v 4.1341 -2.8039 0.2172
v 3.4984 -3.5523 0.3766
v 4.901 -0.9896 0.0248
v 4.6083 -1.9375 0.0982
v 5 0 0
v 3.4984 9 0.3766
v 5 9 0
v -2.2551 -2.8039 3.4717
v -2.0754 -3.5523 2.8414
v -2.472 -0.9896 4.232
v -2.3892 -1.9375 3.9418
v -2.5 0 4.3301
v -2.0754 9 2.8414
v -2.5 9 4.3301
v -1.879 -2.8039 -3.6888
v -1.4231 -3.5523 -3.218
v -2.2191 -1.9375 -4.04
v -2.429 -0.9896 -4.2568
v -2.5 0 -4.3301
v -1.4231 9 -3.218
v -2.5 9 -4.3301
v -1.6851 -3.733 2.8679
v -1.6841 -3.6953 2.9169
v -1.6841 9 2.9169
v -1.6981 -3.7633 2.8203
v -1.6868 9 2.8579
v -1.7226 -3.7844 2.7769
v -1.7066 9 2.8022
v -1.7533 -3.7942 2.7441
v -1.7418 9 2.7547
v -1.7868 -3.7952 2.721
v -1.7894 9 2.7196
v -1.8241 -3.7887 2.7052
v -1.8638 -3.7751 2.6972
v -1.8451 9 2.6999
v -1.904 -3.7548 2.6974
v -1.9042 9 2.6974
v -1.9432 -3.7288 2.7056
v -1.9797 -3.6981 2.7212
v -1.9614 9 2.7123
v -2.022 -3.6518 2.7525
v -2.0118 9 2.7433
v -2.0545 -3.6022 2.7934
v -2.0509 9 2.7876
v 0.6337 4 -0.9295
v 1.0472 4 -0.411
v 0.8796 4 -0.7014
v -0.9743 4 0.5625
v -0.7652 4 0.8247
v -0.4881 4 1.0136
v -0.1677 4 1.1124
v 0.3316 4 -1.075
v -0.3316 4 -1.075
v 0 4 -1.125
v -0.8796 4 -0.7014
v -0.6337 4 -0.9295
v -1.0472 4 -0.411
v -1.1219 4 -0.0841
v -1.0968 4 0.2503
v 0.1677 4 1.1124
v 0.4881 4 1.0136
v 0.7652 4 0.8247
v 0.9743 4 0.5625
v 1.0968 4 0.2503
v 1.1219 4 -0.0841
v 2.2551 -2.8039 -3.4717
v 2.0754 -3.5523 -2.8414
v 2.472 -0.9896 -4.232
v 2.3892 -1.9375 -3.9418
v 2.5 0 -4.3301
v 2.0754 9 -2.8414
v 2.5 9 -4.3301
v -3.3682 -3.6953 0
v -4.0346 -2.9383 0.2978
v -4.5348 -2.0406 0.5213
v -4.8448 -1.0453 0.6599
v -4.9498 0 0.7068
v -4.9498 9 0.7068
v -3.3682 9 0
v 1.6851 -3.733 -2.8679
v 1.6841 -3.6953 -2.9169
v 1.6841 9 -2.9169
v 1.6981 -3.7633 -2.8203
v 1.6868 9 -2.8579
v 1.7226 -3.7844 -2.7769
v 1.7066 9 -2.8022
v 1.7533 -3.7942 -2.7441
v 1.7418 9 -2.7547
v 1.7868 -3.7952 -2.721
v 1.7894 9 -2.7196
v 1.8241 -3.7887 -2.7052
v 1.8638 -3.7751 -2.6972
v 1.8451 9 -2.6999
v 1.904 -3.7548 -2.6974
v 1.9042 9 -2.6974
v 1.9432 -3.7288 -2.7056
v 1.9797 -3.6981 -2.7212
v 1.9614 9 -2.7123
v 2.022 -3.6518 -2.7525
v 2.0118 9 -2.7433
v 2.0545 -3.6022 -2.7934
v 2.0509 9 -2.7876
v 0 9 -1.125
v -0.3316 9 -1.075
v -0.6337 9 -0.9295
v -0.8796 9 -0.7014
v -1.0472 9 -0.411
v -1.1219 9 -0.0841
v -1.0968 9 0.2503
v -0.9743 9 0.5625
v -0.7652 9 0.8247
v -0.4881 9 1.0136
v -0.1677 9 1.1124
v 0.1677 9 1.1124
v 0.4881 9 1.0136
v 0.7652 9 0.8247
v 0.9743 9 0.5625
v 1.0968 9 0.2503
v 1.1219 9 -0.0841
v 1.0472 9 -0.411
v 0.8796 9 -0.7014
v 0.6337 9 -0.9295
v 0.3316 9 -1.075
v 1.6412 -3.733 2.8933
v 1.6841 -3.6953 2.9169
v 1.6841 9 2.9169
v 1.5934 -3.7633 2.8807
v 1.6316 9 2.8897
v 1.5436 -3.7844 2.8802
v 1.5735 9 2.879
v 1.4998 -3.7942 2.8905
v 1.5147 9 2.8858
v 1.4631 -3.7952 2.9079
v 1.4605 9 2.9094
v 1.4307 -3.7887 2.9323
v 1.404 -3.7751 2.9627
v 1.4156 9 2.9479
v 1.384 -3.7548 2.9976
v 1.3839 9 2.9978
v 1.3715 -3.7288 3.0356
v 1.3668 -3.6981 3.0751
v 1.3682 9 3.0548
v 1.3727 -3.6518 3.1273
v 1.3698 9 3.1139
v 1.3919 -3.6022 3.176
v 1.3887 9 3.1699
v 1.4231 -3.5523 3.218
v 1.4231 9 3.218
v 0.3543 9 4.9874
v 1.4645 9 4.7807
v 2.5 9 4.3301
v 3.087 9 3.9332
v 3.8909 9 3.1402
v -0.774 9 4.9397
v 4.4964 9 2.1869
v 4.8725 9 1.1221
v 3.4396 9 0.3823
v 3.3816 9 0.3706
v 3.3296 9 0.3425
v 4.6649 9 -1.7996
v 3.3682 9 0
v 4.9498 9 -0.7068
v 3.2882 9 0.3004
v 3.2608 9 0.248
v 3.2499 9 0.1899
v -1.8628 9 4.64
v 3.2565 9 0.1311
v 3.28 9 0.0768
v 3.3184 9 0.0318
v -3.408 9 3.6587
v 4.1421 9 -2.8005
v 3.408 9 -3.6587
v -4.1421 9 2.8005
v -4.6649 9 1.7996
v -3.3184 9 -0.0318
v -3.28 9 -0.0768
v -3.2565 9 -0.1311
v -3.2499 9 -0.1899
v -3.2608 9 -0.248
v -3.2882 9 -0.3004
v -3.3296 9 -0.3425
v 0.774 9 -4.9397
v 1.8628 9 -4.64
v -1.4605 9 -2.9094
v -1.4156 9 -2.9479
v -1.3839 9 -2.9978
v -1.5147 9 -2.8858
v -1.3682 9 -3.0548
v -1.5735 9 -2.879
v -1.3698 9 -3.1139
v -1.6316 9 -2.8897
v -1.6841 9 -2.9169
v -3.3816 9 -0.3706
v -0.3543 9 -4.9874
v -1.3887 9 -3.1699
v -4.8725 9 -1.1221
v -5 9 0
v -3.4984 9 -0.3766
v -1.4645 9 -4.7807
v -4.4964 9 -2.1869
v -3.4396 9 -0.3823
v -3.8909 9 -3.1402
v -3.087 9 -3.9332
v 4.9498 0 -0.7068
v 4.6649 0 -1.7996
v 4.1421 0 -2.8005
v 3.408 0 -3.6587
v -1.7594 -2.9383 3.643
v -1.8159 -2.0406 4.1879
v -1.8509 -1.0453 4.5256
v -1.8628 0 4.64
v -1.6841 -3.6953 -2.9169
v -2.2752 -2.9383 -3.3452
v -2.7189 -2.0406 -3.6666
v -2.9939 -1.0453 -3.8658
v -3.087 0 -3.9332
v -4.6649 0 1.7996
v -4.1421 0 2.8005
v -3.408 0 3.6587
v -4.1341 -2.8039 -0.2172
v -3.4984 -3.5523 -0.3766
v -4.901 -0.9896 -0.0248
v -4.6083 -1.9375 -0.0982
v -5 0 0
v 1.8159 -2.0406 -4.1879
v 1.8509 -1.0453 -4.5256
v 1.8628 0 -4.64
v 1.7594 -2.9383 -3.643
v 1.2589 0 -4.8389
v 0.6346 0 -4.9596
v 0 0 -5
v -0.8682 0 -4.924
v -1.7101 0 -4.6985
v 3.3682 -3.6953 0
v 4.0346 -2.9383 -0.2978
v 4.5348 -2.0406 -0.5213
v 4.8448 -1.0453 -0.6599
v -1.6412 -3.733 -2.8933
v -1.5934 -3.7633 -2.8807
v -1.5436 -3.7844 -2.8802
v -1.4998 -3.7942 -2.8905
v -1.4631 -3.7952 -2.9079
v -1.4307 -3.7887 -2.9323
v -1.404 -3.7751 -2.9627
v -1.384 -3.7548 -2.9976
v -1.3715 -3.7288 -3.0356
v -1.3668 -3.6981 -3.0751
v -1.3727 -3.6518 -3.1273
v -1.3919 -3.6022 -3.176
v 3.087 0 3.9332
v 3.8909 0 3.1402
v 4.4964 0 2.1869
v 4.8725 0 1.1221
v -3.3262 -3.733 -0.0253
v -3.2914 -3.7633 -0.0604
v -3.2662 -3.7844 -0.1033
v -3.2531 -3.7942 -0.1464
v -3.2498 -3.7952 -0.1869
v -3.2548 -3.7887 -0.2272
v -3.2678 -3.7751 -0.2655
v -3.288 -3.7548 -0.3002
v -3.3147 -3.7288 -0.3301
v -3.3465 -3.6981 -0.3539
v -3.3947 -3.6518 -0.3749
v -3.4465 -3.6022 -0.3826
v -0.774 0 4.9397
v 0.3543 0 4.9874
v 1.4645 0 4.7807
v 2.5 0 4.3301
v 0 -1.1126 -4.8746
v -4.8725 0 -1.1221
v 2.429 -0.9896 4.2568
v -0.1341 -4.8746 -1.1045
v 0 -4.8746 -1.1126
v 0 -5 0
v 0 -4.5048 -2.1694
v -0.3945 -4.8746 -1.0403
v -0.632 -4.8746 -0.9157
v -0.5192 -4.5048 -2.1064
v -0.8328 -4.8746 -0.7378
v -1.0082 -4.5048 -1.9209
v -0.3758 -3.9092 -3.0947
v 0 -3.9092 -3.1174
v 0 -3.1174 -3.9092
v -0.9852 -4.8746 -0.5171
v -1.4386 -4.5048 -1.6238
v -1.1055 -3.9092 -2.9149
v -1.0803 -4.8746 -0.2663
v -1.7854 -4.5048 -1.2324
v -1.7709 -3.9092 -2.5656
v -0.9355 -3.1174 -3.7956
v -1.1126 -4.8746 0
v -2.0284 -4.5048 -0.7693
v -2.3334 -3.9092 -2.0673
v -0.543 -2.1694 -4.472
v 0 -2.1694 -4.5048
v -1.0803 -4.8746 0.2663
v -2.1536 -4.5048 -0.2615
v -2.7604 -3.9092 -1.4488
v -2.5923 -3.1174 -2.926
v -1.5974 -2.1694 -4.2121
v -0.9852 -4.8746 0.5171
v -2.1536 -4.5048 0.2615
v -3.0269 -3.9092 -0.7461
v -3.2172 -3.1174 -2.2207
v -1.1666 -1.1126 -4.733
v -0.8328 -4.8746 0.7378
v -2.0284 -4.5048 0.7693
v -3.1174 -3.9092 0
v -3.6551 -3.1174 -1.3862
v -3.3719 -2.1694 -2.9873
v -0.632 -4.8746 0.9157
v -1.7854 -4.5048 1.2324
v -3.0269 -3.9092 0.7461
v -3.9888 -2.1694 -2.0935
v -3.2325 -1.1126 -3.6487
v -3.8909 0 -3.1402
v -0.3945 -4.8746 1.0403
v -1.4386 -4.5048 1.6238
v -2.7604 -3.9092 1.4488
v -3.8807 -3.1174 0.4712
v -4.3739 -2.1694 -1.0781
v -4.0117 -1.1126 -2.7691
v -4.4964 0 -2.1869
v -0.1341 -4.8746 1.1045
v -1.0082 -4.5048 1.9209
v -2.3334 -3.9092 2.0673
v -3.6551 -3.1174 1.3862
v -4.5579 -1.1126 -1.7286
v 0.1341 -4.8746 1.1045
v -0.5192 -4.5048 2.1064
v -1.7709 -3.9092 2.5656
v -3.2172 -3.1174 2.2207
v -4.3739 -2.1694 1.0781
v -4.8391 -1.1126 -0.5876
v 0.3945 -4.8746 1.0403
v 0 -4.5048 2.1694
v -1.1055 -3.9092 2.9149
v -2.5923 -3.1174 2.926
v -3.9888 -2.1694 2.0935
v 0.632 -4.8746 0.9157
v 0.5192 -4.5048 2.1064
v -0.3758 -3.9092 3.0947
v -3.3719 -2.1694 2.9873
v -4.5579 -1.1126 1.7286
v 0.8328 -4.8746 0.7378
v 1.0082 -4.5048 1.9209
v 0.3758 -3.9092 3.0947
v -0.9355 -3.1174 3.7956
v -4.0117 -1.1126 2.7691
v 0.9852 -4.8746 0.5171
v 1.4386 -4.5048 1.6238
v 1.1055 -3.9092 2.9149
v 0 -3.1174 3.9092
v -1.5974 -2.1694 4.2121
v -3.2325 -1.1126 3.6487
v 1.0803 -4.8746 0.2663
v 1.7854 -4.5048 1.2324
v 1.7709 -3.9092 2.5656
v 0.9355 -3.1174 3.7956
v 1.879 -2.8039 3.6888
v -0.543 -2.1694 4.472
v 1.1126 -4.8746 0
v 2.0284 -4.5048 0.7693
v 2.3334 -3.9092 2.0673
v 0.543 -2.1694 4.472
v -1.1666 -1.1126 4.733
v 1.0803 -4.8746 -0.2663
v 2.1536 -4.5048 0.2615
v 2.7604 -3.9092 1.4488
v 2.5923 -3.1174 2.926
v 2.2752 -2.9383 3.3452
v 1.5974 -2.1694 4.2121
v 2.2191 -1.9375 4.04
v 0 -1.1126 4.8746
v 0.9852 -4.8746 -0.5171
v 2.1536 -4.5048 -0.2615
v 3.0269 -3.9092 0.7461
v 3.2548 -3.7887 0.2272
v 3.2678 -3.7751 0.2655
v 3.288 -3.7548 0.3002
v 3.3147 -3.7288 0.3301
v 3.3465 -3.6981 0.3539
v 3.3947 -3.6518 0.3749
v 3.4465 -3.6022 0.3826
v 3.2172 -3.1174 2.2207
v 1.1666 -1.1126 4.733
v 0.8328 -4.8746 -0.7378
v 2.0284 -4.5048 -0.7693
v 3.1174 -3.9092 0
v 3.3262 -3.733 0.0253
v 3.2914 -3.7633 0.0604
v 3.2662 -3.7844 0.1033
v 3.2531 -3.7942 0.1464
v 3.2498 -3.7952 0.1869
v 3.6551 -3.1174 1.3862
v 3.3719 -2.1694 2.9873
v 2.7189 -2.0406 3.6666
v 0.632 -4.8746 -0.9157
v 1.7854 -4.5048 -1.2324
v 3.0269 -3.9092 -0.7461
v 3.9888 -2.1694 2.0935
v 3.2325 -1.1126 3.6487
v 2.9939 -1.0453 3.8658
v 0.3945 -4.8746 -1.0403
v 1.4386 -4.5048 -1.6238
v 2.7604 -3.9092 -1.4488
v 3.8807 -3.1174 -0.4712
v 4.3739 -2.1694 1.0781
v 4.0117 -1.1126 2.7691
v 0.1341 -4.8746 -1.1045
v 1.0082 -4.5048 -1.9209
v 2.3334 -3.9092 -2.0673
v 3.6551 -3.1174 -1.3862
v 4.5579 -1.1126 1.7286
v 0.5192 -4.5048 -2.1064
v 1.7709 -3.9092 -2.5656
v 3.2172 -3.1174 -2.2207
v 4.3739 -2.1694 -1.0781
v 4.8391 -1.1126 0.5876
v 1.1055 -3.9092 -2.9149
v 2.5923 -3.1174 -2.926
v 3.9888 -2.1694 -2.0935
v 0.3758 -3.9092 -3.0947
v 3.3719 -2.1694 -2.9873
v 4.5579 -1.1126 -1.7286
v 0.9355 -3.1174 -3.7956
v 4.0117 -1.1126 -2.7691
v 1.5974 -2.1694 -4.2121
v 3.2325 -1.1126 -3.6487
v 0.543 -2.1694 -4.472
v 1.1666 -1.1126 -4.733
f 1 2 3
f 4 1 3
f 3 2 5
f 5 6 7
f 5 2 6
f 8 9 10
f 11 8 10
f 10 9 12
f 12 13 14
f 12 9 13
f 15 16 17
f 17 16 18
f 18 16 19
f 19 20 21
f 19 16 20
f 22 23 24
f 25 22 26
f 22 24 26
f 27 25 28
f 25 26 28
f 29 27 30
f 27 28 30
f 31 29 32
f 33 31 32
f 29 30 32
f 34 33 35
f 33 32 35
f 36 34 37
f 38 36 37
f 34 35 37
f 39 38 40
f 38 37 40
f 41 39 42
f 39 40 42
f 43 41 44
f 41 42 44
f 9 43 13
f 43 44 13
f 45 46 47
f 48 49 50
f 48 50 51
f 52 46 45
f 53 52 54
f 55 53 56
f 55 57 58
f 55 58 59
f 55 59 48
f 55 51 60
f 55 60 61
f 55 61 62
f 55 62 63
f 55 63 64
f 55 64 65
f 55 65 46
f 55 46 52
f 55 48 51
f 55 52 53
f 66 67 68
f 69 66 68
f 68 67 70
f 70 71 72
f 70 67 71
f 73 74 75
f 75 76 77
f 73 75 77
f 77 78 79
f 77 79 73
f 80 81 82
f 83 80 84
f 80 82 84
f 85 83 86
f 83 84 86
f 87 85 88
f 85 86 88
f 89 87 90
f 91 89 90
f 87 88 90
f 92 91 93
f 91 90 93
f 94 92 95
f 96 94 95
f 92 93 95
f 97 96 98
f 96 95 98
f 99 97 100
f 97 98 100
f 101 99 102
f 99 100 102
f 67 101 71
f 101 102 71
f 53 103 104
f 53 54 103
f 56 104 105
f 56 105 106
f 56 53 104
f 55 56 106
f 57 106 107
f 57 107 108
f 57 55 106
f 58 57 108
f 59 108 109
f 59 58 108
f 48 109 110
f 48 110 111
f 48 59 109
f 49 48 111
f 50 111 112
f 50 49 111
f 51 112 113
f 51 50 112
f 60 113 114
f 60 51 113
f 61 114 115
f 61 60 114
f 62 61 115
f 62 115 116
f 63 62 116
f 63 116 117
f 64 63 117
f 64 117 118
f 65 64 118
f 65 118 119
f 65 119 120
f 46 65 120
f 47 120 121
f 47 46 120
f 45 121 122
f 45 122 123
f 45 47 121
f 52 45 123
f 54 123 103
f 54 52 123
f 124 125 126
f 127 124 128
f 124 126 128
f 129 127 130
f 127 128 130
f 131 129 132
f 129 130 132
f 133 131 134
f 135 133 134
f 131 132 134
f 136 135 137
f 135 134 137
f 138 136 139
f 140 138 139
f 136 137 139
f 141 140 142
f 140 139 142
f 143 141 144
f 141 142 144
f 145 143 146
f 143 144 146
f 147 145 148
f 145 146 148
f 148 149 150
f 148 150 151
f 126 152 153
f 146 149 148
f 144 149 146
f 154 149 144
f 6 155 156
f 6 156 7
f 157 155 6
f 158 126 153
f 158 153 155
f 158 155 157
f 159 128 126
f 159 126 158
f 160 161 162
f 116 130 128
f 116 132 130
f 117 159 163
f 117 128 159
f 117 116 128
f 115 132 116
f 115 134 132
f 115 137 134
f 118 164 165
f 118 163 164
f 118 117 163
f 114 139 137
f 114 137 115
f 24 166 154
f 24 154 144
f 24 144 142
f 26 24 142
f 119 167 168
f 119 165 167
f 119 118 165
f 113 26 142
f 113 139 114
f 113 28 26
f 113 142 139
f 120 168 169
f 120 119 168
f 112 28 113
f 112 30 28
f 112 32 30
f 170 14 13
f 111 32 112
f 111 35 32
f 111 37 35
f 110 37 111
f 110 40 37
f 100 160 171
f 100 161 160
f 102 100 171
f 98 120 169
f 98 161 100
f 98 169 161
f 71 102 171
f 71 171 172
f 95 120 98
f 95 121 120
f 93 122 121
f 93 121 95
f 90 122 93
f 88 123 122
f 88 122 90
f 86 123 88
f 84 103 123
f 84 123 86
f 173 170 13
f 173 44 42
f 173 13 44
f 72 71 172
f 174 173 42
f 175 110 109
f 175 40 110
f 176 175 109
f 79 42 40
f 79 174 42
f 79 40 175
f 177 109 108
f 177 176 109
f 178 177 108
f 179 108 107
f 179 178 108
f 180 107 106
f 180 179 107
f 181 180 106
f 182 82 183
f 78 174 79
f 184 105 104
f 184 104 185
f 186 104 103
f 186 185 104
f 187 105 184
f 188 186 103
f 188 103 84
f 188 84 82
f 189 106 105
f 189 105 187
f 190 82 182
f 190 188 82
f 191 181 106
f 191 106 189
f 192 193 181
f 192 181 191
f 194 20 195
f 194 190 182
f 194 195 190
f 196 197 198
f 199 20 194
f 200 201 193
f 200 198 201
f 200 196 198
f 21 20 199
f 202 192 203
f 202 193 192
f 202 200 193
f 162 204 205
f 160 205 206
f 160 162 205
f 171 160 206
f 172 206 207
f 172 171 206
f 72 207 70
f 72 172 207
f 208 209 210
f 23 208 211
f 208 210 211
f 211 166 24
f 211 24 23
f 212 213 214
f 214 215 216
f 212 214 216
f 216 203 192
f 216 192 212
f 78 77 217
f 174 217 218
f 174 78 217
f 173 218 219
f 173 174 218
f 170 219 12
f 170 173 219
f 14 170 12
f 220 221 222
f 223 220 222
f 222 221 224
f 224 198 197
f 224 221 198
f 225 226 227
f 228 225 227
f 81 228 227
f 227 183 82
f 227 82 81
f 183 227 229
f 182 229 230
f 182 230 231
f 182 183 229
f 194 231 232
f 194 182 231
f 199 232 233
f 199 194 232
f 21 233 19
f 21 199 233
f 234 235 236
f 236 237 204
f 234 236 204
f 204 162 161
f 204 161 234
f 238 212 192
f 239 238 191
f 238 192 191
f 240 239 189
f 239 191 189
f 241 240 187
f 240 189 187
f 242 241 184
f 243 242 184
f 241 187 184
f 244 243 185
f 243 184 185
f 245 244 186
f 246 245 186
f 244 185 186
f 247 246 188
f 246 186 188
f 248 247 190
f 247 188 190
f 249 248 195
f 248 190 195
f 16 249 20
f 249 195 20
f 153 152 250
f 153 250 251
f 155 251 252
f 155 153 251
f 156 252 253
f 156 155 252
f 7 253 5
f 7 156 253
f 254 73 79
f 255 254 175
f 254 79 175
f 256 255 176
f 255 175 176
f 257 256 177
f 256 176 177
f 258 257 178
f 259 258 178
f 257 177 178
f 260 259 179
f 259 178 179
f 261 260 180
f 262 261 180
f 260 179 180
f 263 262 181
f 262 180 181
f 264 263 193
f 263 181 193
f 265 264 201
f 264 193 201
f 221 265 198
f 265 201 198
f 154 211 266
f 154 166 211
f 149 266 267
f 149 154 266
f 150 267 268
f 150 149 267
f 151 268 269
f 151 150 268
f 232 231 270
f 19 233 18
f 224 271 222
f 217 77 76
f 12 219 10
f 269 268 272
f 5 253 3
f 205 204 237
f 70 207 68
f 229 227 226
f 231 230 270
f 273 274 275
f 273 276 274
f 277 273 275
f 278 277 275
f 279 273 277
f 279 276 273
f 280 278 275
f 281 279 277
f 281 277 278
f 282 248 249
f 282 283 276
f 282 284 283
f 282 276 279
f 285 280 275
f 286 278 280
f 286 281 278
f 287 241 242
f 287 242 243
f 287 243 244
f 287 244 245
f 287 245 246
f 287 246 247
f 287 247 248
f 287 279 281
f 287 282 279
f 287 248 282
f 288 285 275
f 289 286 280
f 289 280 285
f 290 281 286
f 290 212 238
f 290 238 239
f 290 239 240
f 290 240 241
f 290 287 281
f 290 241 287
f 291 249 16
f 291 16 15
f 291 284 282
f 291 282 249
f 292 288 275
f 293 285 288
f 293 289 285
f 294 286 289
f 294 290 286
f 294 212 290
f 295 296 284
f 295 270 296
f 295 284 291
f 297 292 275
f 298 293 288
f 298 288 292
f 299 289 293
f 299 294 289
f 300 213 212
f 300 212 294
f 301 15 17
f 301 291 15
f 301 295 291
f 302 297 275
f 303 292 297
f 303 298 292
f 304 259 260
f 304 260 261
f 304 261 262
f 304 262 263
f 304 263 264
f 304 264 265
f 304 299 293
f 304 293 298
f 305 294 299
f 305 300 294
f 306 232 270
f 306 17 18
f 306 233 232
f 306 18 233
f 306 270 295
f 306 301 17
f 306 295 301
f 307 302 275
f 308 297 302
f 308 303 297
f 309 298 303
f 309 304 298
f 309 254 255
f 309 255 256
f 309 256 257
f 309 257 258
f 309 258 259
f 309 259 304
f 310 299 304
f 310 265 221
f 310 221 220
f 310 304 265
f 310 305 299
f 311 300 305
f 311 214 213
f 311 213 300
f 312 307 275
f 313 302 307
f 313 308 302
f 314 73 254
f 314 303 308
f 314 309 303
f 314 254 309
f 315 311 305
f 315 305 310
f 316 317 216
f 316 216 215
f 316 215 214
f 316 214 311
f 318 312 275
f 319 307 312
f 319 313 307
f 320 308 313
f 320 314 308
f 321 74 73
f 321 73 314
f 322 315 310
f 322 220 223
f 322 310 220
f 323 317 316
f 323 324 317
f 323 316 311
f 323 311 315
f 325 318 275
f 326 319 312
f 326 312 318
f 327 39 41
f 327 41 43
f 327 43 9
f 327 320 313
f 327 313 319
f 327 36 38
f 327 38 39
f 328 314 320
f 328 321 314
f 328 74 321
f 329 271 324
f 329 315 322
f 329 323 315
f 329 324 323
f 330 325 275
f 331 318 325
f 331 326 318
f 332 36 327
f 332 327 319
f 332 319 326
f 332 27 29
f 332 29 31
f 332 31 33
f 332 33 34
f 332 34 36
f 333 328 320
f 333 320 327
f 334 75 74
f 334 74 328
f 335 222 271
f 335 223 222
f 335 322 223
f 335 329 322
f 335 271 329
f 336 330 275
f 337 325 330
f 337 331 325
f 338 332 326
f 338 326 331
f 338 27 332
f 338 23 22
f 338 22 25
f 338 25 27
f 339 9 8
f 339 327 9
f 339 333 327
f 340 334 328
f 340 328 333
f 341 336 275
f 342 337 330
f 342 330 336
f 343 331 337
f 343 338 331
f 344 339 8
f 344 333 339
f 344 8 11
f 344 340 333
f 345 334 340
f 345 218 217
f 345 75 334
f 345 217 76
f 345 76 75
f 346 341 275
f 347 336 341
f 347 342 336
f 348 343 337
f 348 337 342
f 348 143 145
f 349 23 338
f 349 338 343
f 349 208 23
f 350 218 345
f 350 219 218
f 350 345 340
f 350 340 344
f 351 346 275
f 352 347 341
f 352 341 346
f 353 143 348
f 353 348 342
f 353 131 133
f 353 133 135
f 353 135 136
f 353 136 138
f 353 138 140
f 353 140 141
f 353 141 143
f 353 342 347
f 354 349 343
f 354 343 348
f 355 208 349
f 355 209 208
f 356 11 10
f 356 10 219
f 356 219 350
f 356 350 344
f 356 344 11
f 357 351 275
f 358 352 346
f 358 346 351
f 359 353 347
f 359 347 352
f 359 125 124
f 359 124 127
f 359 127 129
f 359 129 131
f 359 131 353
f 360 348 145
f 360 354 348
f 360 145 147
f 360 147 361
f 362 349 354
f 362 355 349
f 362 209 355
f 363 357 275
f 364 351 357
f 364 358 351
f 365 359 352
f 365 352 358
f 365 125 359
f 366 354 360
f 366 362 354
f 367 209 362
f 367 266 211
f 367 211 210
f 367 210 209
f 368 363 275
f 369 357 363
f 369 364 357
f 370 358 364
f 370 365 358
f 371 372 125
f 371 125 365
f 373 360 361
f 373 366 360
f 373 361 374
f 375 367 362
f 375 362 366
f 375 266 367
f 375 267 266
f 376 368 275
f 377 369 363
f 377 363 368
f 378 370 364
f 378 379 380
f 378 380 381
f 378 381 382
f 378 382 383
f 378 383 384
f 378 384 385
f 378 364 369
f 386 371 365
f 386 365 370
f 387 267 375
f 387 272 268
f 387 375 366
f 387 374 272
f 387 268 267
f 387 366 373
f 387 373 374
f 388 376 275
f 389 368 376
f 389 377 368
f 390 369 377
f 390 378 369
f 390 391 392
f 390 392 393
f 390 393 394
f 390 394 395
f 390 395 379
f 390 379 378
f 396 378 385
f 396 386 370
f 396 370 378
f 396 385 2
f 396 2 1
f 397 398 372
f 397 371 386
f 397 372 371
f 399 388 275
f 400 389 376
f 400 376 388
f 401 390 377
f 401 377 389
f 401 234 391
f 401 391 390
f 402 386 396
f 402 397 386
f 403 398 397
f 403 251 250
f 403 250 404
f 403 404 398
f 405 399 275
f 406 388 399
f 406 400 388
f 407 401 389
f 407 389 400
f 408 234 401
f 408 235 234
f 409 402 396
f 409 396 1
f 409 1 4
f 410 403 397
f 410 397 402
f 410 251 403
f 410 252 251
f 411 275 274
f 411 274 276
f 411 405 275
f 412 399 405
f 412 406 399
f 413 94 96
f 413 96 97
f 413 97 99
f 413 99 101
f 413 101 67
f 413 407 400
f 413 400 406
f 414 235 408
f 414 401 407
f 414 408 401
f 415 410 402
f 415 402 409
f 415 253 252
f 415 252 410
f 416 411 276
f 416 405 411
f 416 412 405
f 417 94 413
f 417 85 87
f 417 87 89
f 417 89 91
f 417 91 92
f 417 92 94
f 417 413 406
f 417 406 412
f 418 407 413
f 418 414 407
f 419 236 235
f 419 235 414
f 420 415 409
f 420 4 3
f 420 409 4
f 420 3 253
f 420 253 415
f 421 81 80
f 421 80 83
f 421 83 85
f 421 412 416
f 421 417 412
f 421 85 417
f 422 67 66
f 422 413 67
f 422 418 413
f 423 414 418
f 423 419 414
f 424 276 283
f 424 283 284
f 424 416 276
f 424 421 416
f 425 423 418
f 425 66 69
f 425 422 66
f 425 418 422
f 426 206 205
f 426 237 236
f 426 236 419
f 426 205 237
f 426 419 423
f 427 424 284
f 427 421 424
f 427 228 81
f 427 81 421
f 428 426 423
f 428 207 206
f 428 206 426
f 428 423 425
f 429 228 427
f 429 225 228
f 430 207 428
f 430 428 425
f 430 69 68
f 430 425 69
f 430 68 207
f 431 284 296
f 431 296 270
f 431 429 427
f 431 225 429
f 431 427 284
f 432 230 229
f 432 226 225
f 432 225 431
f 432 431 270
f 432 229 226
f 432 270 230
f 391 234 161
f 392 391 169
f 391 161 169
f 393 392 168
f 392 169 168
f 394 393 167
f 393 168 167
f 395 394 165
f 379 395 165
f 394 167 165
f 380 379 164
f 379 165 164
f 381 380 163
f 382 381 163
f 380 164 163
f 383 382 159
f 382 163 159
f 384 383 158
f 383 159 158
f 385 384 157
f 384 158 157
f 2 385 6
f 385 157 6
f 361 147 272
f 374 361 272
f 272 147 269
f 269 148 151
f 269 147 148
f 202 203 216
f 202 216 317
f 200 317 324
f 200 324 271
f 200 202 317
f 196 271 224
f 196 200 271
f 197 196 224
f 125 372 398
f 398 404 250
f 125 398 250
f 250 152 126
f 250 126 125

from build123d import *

# Parameters (mm, degrees)
CUT_EXTRUDE1_DEPTH = 16.684387141
CIRPATTERN1_COUNT  = 6


with BuildPart() as part:
    # Sketch1 → Revolve1 (revolve)
    with BuildSketch(Plane.XY):
        with BuildLine():
            Line((-5, 9), (-1.125, 9))
            Line((-1.125, 9), (-1.125, 4))
            Line((-1.125, 4), (0, 4))
            Line((0, 4), (0, -5))
            ThreePointArc((0, -5), (-3.535533906, -3.535533906), (-5, 0))
            Line((-5, 0), (-5, 9))
        make_face()
    revolve(axis=Axis((0, 0, 0), (0, 1, 0)))

    # Sketch2 → Cut-Extrude1 (cut, through all)
    with BuildSketch(Plane(origin=(0, 9, 0), x_dir=(1, 0, 0), z_dir=(0, 1, 0))):
        with BuildLine():
            Line((-4.94979148, -0.706798632), (-3.36819132, 0))
            ThreePointArc((-3.36819132, 0), (-3.260778077, 0.247971643), (-3.498444432, 0.376588299))
            Line((-3.498444432, 0.376588299), (-5, 0))
            ThreePointArc((-5, 0), (-4.987432075, -0.354289854), (-4.94979148, -0.706798632))
        make_face()
    cut_extrude1 = extrude(amount=-CUT_EXTRUDE1_DEPTH, mode=Mode.SUBTRACT)

    # CirPattern1: Cut-Extrude1 ×6 about axis
    cirpattern1_axis = Axis((0, 9, 0), (0, -1, 0))
    for i in range(1, CIRPATTERN1_COUNT):
        add(cut_extrude1.rotate(cirpattern1_axis, i * 360 / CIRPATTERN1_COUNT), mode=Mode.SUBTRACT)


solid = part.part
